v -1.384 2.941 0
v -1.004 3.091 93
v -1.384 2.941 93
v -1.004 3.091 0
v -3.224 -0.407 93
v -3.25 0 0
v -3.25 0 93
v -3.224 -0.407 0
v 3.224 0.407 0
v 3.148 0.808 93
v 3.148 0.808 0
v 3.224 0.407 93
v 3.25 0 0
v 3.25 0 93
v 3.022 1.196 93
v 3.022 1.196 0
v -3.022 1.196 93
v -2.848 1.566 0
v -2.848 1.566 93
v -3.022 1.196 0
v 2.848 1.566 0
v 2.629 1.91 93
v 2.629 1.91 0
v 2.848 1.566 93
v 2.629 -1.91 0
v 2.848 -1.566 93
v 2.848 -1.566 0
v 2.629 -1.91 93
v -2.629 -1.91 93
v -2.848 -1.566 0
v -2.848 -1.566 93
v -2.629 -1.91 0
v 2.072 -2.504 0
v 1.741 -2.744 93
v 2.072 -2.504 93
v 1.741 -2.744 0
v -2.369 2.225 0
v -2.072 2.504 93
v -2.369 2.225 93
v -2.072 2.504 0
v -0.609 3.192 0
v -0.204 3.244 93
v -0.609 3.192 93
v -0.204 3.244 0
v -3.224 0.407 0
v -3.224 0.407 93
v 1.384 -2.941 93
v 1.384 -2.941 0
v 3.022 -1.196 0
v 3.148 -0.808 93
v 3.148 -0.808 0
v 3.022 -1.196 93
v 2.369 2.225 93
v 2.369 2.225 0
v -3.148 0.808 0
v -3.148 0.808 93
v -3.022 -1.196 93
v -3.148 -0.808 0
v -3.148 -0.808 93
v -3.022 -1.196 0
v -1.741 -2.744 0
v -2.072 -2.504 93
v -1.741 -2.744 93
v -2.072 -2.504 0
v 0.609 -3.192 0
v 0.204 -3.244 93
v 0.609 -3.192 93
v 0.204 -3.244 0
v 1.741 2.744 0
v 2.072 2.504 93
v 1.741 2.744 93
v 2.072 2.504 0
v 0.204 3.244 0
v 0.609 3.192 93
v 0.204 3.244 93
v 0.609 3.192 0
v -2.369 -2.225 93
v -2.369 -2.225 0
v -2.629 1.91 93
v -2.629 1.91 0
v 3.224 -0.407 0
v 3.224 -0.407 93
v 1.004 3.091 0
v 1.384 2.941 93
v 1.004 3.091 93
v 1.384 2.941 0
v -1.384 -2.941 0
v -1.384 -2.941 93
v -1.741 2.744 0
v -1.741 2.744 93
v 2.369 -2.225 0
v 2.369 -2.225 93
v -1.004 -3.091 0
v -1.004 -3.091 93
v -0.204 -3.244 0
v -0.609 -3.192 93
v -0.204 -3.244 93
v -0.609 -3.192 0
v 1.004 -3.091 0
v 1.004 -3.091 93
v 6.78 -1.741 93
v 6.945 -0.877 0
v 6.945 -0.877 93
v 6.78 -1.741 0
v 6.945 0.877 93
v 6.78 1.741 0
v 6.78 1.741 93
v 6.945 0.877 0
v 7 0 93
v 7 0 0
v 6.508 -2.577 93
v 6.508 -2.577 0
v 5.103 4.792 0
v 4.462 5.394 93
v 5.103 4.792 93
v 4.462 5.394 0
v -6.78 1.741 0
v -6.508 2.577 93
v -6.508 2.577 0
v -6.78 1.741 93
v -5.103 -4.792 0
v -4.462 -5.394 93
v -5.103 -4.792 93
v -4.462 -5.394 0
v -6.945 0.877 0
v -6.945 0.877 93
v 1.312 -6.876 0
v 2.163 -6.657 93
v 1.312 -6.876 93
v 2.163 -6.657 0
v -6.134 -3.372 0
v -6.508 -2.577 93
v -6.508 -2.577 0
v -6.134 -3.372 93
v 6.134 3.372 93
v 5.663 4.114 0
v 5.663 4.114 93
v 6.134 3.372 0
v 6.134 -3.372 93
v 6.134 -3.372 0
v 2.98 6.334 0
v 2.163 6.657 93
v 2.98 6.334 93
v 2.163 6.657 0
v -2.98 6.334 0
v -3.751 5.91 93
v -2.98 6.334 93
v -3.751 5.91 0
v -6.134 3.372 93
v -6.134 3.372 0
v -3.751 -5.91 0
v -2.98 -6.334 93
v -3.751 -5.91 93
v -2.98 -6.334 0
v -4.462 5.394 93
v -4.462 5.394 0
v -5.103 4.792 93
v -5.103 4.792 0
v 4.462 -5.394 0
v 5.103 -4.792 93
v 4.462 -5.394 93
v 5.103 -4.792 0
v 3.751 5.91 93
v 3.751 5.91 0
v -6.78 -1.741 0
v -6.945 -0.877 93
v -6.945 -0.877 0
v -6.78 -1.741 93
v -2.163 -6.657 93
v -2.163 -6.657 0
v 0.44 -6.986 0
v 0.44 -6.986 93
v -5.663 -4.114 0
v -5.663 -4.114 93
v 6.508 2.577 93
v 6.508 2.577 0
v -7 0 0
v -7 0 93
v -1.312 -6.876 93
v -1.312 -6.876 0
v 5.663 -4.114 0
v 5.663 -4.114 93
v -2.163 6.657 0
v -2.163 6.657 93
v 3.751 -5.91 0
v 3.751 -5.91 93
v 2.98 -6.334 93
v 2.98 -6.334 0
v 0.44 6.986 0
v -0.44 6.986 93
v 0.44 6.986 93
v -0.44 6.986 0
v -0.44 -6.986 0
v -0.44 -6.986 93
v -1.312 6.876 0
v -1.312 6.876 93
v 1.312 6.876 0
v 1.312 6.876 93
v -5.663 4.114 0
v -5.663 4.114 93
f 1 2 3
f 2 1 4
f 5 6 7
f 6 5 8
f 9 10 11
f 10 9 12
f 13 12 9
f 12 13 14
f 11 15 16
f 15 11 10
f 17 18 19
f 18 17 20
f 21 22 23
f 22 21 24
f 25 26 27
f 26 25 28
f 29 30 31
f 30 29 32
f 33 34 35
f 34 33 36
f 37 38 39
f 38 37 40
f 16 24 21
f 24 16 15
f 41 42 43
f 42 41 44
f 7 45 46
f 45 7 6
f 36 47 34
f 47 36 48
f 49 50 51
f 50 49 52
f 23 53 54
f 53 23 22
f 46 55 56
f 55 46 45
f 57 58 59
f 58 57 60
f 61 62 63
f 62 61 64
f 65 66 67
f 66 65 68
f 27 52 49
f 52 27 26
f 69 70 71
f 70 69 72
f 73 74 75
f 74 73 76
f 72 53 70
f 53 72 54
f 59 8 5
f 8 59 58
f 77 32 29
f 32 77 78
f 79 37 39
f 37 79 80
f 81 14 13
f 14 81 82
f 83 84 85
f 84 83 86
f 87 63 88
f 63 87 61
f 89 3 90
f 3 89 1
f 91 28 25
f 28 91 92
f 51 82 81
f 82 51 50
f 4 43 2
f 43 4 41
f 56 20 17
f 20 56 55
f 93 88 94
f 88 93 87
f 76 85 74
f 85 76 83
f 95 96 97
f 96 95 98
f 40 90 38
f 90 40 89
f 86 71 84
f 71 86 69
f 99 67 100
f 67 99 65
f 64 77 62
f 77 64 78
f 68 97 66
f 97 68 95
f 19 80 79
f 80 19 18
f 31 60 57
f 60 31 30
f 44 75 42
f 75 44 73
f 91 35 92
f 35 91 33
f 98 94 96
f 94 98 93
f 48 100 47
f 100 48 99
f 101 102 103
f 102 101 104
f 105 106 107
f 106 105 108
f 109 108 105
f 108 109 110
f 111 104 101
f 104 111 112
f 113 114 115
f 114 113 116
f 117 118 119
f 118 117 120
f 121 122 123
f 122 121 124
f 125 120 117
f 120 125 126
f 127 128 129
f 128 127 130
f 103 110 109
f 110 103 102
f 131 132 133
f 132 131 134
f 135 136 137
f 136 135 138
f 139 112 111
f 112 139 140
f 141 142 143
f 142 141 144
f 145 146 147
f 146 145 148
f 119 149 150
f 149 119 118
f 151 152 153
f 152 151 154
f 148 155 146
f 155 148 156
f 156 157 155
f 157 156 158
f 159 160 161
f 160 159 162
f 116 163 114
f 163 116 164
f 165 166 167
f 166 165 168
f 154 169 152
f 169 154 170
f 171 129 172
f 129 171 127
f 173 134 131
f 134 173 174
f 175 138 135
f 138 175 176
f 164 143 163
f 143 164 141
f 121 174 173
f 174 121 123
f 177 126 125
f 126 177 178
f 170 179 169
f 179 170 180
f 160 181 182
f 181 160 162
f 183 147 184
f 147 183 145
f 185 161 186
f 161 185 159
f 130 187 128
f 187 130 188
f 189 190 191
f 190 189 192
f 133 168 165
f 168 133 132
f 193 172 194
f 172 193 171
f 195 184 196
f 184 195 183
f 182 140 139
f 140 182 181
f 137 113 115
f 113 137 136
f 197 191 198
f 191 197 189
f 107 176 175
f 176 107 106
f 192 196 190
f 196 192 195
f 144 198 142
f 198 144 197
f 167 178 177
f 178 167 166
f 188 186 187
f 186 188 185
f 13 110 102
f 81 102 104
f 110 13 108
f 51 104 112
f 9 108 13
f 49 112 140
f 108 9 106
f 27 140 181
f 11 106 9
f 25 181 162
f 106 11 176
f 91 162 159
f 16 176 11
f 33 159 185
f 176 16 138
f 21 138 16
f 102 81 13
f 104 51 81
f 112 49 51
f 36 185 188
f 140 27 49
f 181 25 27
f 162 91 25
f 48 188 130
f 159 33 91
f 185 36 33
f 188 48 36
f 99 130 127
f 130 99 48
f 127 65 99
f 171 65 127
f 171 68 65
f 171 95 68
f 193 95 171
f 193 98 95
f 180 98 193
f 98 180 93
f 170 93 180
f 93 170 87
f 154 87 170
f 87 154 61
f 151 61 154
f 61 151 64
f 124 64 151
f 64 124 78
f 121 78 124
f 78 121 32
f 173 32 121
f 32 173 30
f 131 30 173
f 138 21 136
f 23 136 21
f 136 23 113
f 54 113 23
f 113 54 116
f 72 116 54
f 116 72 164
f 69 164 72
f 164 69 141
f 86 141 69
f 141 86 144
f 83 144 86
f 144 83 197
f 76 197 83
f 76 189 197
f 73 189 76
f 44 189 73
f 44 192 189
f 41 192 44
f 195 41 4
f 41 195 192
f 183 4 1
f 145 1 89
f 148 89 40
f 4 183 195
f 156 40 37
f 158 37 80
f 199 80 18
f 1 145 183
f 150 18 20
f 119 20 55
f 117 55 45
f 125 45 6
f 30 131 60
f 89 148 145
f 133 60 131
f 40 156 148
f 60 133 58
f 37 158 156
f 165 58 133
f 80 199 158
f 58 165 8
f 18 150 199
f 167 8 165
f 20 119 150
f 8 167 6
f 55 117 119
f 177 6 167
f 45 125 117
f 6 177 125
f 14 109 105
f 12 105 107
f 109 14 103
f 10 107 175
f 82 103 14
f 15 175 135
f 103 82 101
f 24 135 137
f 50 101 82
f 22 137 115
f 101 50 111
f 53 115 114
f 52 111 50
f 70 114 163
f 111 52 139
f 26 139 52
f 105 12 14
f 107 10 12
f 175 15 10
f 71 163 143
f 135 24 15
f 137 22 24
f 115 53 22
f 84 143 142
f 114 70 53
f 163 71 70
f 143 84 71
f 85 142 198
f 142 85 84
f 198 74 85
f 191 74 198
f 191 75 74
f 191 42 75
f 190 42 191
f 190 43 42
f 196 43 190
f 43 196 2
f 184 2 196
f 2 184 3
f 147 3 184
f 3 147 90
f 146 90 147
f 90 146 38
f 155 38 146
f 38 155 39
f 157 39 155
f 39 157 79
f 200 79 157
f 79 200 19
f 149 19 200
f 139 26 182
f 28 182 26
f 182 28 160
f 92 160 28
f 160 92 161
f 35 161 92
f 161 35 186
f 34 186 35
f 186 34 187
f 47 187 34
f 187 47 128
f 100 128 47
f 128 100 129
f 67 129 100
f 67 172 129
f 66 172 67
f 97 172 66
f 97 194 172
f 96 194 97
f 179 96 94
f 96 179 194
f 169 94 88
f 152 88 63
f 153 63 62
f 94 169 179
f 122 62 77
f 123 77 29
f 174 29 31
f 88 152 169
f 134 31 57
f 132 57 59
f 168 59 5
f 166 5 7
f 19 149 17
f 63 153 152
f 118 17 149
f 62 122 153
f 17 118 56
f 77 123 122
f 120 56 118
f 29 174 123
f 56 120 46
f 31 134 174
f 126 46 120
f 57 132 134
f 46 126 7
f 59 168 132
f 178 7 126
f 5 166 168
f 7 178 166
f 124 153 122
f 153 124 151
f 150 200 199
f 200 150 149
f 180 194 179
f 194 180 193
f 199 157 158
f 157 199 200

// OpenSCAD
$fn = 50;


difference() {
	union() {
		cylinder(h = 93, r = 7.0000000000);
	}
	union() {
		translate(v = [0.0000000000, 0.0000000000, -100.0000000000]) {
			cylinder(h = 200, r = 3.2500000000);
		}
		cylinder(h = 93, r = 1.8000000000);
		cylinder(h = 93, r = 1.8000000000);
		cylinder(h = 93, r = 1.8000000000);
	}
}
